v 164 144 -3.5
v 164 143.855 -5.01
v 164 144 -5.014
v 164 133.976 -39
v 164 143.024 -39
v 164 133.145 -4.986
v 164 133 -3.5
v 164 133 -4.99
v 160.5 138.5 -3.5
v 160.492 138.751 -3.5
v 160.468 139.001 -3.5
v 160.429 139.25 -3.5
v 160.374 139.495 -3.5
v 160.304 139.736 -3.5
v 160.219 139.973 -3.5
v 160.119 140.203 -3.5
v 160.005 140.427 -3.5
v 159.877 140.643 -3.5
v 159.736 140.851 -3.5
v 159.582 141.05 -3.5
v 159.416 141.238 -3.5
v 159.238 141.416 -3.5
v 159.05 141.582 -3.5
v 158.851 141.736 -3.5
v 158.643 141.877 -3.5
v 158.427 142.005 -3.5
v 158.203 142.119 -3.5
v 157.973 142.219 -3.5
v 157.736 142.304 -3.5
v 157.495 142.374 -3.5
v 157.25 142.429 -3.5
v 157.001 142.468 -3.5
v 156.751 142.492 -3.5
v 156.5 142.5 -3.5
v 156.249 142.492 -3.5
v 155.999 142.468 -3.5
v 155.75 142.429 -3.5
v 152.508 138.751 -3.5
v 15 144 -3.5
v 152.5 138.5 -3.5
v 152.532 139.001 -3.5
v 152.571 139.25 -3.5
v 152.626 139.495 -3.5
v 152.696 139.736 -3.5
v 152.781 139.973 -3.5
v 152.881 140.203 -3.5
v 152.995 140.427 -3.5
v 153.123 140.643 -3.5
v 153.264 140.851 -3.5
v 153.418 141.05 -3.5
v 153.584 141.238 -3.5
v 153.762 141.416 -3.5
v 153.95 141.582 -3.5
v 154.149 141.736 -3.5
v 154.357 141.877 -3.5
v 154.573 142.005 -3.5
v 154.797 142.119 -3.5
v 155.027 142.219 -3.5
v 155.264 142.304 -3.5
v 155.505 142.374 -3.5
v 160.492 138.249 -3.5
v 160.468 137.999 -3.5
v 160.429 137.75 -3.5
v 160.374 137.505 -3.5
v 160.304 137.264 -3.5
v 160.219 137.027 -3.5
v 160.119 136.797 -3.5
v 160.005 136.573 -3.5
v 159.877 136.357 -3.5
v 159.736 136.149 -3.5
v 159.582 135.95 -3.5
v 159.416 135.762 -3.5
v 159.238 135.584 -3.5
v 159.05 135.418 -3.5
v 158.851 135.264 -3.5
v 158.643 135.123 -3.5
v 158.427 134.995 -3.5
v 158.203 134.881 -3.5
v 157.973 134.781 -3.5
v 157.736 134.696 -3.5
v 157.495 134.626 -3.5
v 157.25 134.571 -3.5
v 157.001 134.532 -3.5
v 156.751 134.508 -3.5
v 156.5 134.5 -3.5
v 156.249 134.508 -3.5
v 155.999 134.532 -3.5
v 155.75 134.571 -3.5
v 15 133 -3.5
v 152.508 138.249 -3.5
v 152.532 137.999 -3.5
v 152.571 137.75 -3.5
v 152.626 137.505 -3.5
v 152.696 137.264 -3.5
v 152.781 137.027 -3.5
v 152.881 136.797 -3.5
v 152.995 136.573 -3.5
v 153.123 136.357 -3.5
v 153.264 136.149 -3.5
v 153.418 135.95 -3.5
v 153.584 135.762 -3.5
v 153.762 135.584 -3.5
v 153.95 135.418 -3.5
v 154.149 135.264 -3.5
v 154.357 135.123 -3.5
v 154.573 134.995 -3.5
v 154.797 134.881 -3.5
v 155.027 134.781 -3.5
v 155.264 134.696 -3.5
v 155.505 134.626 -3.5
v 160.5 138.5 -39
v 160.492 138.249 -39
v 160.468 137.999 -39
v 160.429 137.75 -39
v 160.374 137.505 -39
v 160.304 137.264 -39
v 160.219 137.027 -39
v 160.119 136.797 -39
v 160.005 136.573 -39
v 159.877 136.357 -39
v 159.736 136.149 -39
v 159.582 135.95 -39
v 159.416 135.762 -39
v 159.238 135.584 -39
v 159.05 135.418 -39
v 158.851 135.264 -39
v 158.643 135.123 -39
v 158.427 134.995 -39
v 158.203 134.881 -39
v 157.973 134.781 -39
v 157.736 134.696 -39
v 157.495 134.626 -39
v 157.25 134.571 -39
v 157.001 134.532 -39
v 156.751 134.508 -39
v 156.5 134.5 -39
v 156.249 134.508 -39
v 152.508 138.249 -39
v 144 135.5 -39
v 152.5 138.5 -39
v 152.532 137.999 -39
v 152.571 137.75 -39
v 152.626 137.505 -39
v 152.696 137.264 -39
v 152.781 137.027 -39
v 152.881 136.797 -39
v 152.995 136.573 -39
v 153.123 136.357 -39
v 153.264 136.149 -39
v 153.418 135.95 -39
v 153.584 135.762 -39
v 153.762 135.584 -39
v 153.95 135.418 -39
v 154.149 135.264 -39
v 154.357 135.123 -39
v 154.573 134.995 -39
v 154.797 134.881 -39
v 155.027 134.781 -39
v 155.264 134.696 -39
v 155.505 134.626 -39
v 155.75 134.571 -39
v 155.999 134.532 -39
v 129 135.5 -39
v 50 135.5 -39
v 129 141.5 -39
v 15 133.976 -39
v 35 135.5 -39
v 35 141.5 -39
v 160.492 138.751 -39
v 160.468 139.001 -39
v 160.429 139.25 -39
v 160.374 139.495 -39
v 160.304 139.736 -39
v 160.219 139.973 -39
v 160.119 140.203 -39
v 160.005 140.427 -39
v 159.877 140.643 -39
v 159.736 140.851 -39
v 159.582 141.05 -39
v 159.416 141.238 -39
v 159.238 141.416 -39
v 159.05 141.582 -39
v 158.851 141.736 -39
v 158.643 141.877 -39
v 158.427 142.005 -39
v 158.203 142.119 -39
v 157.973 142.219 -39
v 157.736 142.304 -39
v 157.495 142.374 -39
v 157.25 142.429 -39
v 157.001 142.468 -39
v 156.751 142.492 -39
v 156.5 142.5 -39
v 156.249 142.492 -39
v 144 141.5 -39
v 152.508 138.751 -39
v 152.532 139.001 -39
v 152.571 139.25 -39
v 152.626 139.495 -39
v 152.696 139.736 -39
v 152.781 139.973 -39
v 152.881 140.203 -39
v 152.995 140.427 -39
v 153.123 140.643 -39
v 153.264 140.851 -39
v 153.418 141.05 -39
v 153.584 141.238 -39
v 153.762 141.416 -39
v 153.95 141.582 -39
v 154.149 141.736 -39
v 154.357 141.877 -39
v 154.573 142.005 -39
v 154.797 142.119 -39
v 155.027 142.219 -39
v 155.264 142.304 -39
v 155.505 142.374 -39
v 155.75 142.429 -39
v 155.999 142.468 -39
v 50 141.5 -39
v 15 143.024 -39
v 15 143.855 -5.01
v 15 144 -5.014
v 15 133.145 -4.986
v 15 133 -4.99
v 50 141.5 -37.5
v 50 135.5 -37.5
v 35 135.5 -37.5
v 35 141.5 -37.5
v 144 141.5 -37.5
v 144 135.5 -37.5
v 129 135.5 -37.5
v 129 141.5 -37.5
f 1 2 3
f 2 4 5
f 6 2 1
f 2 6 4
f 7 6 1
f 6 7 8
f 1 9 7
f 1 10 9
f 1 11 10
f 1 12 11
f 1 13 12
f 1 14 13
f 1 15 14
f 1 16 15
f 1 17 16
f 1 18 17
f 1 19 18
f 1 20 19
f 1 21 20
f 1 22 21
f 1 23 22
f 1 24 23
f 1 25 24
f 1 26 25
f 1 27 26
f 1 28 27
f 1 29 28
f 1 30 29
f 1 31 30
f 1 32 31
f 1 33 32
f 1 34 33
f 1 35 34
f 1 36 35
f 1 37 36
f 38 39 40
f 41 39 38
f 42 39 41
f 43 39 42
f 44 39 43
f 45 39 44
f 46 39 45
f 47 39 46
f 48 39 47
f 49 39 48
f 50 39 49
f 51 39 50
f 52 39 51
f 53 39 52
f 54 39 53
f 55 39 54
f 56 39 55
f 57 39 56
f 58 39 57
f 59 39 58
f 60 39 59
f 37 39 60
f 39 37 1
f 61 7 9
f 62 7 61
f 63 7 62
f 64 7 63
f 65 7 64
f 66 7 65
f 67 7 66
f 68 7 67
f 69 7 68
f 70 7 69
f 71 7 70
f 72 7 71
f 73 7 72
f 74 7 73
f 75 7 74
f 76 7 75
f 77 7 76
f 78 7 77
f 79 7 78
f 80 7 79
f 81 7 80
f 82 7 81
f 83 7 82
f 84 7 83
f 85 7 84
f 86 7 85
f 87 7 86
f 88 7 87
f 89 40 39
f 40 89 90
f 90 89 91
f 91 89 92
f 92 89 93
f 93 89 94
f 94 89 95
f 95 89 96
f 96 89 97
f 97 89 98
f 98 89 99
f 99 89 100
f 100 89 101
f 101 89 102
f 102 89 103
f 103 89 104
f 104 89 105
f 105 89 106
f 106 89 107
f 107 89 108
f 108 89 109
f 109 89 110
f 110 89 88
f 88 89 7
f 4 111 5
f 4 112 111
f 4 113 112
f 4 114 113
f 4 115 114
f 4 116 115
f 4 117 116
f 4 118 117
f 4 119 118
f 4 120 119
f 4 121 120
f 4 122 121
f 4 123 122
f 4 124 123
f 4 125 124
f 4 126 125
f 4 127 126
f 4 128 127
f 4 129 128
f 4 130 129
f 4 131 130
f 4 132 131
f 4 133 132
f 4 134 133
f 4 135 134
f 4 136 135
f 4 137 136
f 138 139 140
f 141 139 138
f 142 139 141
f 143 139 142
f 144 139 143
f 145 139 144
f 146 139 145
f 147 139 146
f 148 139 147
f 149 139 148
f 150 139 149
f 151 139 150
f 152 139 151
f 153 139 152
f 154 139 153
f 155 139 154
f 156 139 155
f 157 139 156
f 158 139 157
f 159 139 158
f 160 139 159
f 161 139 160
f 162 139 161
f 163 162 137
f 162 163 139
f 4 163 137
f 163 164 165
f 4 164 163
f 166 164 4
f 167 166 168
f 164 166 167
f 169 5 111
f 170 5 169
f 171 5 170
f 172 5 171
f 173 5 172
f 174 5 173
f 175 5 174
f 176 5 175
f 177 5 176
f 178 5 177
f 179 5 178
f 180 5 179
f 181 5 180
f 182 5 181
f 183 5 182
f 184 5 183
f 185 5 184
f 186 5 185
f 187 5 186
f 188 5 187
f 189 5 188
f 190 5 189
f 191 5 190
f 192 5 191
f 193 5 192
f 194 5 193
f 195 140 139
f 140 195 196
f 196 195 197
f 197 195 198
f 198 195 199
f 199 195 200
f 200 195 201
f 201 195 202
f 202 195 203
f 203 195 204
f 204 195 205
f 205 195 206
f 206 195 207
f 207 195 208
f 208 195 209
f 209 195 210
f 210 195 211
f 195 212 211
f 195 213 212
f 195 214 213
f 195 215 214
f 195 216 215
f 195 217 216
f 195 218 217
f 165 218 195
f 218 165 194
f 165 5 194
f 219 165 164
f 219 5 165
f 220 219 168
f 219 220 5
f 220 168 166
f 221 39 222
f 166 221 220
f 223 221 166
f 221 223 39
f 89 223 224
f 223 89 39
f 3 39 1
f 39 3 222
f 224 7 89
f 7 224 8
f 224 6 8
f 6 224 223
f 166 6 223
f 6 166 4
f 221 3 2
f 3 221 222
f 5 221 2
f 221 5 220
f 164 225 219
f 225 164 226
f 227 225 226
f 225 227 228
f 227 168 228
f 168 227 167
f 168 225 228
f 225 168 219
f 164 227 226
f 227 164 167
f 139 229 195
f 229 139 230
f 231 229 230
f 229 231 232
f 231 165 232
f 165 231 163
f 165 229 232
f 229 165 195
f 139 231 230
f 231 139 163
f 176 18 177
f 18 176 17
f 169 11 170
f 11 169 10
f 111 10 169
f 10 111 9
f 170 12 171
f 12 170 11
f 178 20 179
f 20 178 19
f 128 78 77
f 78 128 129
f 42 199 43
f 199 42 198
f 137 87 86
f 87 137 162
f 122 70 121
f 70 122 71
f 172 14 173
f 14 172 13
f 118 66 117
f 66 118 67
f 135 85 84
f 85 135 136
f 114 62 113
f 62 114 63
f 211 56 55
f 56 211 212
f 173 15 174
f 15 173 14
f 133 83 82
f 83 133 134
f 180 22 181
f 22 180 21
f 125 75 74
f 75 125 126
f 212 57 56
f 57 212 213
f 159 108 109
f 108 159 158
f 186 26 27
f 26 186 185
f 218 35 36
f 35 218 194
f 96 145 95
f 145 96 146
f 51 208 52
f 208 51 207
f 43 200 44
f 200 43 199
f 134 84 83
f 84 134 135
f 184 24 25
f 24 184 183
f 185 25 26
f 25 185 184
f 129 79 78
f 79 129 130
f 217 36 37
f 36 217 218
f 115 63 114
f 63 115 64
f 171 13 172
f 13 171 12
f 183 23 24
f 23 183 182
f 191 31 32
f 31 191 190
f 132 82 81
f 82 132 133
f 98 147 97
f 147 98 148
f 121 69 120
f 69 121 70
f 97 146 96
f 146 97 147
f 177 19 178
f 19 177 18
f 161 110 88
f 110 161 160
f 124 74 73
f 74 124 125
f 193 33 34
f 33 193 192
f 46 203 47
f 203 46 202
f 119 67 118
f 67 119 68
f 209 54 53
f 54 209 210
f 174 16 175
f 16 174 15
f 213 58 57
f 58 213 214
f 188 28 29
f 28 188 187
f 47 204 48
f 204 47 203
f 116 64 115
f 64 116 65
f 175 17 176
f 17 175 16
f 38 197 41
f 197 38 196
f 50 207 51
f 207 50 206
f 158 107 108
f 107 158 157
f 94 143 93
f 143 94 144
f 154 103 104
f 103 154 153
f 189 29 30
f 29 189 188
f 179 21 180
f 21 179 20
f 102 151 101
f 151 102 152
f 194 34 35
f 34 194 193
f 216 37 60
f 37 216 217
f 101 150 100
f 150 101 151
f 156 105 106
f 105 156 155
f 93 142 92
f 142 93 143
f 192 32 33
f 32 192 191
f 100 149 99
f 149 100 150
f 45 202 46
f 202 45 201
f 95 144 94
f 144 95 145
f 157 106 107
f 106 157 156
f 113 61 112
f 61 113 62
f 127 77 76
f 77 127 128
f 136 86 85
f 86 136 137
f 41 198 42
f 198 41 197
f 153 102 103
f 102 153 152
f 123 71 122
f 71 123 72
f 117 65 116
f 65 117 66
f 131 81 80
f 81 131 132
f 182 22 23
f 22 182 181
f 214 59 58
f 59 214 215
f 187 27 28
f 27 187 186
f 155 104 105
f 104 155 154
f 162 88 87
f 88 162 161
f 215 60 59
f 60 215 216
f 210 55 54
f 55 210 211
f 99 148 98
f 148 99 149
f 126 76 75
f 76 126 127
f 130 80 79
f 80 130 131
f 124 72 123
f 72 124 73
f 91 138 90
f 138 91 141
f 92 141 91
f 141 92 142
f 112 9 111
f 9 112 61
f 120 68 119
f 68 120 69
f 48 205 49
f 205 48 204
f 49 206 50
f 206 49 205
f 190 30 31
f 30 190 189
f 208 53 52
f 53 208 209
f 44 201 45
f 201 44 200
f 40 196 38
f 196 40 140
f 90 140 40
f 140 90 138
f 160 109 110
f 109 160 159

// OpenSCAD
$fn=100;

difference () { // Second Pied
    translate([15,133,-5-34])
        cube([184-20-15,11,34+1.5]);//+1 for insersion
 
    translate([14,133,-5-35])
        rotate([1.4,0,0]) 
            cube([184-20-15+2,1,35]);

    
    translate([14,11+132,-5-35])
        rotate([-1.4,0,0]) 
            cube([184-20-15+2,1,35]);
        // Place des tampons sous les pieds
    translate([15+20,133+5.5-3,-5-34-1])
        cube([15,6,2.5]);
    translate([15+184-20-15-20-15,133+5.5-3,-5-34-1])
        cube([15,6,2.5]);
    // Trou pour la vis décalée
    translate([184-20-8+0.5,138.5,-6-34]) // gros plots 4 intérieur
        cylinder(r=4,h=33+34);
}
